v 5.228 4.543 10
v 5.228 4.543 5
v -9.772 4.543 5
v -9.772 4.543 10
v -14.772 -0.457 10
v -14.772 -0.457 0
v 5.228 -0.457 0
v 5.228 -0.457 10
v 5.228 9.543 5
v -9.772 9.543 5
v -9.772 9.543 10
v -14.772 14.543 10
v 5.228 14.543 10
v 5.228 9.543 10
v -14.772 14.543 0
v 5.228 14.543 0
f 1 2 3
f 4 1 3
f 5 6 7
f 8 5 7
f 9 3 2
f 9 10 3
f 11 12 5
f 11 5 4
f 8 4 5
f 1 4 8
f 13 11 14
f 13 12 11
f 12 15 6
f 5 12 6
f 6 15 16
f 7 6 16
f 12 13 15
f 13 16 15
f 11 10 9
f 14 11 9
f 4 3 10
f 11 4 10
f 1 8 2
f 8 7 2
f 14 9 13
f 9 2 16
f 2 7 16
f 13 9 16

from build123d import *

# Parameters (mm, degrees)
SKETCH_1_W      = 20
SKETCH_1_H      = 15
EXTRUDE_1_DEPTH = 5
EXTRUDE_2_DEPTH = 5


with BuildPart() as part:
    # 草图1 → 凸台-拉伸1 (new body)
    with BuildSketch(Plane.XY):
        with Locations((-4.771573604, 7.043147208)):
            Rectangle(SKETCH_1_W, SKETCH_1_H)
    extrude(amount=EXTRUDE_1_DEPTH)

    # 草图4 → 凸台-拉伸2 (add)
    with BuildSketch(Plane.XY.offset(5)):
        Polygon((-14.771573604, -0.456852792), (5.228426396, -0.456852792), (5.228426396, 4.543147208), (-9.771573604, 4.543147208), (-9.771573604, 9.543147208), (5.228426396, 9.543147208), (5.228426396, 14.543147208), (-14.771573604, 14.543147208), align=None)
    extrude(amount=EXTRUDE_2_DEPTH)


solid = part.part
